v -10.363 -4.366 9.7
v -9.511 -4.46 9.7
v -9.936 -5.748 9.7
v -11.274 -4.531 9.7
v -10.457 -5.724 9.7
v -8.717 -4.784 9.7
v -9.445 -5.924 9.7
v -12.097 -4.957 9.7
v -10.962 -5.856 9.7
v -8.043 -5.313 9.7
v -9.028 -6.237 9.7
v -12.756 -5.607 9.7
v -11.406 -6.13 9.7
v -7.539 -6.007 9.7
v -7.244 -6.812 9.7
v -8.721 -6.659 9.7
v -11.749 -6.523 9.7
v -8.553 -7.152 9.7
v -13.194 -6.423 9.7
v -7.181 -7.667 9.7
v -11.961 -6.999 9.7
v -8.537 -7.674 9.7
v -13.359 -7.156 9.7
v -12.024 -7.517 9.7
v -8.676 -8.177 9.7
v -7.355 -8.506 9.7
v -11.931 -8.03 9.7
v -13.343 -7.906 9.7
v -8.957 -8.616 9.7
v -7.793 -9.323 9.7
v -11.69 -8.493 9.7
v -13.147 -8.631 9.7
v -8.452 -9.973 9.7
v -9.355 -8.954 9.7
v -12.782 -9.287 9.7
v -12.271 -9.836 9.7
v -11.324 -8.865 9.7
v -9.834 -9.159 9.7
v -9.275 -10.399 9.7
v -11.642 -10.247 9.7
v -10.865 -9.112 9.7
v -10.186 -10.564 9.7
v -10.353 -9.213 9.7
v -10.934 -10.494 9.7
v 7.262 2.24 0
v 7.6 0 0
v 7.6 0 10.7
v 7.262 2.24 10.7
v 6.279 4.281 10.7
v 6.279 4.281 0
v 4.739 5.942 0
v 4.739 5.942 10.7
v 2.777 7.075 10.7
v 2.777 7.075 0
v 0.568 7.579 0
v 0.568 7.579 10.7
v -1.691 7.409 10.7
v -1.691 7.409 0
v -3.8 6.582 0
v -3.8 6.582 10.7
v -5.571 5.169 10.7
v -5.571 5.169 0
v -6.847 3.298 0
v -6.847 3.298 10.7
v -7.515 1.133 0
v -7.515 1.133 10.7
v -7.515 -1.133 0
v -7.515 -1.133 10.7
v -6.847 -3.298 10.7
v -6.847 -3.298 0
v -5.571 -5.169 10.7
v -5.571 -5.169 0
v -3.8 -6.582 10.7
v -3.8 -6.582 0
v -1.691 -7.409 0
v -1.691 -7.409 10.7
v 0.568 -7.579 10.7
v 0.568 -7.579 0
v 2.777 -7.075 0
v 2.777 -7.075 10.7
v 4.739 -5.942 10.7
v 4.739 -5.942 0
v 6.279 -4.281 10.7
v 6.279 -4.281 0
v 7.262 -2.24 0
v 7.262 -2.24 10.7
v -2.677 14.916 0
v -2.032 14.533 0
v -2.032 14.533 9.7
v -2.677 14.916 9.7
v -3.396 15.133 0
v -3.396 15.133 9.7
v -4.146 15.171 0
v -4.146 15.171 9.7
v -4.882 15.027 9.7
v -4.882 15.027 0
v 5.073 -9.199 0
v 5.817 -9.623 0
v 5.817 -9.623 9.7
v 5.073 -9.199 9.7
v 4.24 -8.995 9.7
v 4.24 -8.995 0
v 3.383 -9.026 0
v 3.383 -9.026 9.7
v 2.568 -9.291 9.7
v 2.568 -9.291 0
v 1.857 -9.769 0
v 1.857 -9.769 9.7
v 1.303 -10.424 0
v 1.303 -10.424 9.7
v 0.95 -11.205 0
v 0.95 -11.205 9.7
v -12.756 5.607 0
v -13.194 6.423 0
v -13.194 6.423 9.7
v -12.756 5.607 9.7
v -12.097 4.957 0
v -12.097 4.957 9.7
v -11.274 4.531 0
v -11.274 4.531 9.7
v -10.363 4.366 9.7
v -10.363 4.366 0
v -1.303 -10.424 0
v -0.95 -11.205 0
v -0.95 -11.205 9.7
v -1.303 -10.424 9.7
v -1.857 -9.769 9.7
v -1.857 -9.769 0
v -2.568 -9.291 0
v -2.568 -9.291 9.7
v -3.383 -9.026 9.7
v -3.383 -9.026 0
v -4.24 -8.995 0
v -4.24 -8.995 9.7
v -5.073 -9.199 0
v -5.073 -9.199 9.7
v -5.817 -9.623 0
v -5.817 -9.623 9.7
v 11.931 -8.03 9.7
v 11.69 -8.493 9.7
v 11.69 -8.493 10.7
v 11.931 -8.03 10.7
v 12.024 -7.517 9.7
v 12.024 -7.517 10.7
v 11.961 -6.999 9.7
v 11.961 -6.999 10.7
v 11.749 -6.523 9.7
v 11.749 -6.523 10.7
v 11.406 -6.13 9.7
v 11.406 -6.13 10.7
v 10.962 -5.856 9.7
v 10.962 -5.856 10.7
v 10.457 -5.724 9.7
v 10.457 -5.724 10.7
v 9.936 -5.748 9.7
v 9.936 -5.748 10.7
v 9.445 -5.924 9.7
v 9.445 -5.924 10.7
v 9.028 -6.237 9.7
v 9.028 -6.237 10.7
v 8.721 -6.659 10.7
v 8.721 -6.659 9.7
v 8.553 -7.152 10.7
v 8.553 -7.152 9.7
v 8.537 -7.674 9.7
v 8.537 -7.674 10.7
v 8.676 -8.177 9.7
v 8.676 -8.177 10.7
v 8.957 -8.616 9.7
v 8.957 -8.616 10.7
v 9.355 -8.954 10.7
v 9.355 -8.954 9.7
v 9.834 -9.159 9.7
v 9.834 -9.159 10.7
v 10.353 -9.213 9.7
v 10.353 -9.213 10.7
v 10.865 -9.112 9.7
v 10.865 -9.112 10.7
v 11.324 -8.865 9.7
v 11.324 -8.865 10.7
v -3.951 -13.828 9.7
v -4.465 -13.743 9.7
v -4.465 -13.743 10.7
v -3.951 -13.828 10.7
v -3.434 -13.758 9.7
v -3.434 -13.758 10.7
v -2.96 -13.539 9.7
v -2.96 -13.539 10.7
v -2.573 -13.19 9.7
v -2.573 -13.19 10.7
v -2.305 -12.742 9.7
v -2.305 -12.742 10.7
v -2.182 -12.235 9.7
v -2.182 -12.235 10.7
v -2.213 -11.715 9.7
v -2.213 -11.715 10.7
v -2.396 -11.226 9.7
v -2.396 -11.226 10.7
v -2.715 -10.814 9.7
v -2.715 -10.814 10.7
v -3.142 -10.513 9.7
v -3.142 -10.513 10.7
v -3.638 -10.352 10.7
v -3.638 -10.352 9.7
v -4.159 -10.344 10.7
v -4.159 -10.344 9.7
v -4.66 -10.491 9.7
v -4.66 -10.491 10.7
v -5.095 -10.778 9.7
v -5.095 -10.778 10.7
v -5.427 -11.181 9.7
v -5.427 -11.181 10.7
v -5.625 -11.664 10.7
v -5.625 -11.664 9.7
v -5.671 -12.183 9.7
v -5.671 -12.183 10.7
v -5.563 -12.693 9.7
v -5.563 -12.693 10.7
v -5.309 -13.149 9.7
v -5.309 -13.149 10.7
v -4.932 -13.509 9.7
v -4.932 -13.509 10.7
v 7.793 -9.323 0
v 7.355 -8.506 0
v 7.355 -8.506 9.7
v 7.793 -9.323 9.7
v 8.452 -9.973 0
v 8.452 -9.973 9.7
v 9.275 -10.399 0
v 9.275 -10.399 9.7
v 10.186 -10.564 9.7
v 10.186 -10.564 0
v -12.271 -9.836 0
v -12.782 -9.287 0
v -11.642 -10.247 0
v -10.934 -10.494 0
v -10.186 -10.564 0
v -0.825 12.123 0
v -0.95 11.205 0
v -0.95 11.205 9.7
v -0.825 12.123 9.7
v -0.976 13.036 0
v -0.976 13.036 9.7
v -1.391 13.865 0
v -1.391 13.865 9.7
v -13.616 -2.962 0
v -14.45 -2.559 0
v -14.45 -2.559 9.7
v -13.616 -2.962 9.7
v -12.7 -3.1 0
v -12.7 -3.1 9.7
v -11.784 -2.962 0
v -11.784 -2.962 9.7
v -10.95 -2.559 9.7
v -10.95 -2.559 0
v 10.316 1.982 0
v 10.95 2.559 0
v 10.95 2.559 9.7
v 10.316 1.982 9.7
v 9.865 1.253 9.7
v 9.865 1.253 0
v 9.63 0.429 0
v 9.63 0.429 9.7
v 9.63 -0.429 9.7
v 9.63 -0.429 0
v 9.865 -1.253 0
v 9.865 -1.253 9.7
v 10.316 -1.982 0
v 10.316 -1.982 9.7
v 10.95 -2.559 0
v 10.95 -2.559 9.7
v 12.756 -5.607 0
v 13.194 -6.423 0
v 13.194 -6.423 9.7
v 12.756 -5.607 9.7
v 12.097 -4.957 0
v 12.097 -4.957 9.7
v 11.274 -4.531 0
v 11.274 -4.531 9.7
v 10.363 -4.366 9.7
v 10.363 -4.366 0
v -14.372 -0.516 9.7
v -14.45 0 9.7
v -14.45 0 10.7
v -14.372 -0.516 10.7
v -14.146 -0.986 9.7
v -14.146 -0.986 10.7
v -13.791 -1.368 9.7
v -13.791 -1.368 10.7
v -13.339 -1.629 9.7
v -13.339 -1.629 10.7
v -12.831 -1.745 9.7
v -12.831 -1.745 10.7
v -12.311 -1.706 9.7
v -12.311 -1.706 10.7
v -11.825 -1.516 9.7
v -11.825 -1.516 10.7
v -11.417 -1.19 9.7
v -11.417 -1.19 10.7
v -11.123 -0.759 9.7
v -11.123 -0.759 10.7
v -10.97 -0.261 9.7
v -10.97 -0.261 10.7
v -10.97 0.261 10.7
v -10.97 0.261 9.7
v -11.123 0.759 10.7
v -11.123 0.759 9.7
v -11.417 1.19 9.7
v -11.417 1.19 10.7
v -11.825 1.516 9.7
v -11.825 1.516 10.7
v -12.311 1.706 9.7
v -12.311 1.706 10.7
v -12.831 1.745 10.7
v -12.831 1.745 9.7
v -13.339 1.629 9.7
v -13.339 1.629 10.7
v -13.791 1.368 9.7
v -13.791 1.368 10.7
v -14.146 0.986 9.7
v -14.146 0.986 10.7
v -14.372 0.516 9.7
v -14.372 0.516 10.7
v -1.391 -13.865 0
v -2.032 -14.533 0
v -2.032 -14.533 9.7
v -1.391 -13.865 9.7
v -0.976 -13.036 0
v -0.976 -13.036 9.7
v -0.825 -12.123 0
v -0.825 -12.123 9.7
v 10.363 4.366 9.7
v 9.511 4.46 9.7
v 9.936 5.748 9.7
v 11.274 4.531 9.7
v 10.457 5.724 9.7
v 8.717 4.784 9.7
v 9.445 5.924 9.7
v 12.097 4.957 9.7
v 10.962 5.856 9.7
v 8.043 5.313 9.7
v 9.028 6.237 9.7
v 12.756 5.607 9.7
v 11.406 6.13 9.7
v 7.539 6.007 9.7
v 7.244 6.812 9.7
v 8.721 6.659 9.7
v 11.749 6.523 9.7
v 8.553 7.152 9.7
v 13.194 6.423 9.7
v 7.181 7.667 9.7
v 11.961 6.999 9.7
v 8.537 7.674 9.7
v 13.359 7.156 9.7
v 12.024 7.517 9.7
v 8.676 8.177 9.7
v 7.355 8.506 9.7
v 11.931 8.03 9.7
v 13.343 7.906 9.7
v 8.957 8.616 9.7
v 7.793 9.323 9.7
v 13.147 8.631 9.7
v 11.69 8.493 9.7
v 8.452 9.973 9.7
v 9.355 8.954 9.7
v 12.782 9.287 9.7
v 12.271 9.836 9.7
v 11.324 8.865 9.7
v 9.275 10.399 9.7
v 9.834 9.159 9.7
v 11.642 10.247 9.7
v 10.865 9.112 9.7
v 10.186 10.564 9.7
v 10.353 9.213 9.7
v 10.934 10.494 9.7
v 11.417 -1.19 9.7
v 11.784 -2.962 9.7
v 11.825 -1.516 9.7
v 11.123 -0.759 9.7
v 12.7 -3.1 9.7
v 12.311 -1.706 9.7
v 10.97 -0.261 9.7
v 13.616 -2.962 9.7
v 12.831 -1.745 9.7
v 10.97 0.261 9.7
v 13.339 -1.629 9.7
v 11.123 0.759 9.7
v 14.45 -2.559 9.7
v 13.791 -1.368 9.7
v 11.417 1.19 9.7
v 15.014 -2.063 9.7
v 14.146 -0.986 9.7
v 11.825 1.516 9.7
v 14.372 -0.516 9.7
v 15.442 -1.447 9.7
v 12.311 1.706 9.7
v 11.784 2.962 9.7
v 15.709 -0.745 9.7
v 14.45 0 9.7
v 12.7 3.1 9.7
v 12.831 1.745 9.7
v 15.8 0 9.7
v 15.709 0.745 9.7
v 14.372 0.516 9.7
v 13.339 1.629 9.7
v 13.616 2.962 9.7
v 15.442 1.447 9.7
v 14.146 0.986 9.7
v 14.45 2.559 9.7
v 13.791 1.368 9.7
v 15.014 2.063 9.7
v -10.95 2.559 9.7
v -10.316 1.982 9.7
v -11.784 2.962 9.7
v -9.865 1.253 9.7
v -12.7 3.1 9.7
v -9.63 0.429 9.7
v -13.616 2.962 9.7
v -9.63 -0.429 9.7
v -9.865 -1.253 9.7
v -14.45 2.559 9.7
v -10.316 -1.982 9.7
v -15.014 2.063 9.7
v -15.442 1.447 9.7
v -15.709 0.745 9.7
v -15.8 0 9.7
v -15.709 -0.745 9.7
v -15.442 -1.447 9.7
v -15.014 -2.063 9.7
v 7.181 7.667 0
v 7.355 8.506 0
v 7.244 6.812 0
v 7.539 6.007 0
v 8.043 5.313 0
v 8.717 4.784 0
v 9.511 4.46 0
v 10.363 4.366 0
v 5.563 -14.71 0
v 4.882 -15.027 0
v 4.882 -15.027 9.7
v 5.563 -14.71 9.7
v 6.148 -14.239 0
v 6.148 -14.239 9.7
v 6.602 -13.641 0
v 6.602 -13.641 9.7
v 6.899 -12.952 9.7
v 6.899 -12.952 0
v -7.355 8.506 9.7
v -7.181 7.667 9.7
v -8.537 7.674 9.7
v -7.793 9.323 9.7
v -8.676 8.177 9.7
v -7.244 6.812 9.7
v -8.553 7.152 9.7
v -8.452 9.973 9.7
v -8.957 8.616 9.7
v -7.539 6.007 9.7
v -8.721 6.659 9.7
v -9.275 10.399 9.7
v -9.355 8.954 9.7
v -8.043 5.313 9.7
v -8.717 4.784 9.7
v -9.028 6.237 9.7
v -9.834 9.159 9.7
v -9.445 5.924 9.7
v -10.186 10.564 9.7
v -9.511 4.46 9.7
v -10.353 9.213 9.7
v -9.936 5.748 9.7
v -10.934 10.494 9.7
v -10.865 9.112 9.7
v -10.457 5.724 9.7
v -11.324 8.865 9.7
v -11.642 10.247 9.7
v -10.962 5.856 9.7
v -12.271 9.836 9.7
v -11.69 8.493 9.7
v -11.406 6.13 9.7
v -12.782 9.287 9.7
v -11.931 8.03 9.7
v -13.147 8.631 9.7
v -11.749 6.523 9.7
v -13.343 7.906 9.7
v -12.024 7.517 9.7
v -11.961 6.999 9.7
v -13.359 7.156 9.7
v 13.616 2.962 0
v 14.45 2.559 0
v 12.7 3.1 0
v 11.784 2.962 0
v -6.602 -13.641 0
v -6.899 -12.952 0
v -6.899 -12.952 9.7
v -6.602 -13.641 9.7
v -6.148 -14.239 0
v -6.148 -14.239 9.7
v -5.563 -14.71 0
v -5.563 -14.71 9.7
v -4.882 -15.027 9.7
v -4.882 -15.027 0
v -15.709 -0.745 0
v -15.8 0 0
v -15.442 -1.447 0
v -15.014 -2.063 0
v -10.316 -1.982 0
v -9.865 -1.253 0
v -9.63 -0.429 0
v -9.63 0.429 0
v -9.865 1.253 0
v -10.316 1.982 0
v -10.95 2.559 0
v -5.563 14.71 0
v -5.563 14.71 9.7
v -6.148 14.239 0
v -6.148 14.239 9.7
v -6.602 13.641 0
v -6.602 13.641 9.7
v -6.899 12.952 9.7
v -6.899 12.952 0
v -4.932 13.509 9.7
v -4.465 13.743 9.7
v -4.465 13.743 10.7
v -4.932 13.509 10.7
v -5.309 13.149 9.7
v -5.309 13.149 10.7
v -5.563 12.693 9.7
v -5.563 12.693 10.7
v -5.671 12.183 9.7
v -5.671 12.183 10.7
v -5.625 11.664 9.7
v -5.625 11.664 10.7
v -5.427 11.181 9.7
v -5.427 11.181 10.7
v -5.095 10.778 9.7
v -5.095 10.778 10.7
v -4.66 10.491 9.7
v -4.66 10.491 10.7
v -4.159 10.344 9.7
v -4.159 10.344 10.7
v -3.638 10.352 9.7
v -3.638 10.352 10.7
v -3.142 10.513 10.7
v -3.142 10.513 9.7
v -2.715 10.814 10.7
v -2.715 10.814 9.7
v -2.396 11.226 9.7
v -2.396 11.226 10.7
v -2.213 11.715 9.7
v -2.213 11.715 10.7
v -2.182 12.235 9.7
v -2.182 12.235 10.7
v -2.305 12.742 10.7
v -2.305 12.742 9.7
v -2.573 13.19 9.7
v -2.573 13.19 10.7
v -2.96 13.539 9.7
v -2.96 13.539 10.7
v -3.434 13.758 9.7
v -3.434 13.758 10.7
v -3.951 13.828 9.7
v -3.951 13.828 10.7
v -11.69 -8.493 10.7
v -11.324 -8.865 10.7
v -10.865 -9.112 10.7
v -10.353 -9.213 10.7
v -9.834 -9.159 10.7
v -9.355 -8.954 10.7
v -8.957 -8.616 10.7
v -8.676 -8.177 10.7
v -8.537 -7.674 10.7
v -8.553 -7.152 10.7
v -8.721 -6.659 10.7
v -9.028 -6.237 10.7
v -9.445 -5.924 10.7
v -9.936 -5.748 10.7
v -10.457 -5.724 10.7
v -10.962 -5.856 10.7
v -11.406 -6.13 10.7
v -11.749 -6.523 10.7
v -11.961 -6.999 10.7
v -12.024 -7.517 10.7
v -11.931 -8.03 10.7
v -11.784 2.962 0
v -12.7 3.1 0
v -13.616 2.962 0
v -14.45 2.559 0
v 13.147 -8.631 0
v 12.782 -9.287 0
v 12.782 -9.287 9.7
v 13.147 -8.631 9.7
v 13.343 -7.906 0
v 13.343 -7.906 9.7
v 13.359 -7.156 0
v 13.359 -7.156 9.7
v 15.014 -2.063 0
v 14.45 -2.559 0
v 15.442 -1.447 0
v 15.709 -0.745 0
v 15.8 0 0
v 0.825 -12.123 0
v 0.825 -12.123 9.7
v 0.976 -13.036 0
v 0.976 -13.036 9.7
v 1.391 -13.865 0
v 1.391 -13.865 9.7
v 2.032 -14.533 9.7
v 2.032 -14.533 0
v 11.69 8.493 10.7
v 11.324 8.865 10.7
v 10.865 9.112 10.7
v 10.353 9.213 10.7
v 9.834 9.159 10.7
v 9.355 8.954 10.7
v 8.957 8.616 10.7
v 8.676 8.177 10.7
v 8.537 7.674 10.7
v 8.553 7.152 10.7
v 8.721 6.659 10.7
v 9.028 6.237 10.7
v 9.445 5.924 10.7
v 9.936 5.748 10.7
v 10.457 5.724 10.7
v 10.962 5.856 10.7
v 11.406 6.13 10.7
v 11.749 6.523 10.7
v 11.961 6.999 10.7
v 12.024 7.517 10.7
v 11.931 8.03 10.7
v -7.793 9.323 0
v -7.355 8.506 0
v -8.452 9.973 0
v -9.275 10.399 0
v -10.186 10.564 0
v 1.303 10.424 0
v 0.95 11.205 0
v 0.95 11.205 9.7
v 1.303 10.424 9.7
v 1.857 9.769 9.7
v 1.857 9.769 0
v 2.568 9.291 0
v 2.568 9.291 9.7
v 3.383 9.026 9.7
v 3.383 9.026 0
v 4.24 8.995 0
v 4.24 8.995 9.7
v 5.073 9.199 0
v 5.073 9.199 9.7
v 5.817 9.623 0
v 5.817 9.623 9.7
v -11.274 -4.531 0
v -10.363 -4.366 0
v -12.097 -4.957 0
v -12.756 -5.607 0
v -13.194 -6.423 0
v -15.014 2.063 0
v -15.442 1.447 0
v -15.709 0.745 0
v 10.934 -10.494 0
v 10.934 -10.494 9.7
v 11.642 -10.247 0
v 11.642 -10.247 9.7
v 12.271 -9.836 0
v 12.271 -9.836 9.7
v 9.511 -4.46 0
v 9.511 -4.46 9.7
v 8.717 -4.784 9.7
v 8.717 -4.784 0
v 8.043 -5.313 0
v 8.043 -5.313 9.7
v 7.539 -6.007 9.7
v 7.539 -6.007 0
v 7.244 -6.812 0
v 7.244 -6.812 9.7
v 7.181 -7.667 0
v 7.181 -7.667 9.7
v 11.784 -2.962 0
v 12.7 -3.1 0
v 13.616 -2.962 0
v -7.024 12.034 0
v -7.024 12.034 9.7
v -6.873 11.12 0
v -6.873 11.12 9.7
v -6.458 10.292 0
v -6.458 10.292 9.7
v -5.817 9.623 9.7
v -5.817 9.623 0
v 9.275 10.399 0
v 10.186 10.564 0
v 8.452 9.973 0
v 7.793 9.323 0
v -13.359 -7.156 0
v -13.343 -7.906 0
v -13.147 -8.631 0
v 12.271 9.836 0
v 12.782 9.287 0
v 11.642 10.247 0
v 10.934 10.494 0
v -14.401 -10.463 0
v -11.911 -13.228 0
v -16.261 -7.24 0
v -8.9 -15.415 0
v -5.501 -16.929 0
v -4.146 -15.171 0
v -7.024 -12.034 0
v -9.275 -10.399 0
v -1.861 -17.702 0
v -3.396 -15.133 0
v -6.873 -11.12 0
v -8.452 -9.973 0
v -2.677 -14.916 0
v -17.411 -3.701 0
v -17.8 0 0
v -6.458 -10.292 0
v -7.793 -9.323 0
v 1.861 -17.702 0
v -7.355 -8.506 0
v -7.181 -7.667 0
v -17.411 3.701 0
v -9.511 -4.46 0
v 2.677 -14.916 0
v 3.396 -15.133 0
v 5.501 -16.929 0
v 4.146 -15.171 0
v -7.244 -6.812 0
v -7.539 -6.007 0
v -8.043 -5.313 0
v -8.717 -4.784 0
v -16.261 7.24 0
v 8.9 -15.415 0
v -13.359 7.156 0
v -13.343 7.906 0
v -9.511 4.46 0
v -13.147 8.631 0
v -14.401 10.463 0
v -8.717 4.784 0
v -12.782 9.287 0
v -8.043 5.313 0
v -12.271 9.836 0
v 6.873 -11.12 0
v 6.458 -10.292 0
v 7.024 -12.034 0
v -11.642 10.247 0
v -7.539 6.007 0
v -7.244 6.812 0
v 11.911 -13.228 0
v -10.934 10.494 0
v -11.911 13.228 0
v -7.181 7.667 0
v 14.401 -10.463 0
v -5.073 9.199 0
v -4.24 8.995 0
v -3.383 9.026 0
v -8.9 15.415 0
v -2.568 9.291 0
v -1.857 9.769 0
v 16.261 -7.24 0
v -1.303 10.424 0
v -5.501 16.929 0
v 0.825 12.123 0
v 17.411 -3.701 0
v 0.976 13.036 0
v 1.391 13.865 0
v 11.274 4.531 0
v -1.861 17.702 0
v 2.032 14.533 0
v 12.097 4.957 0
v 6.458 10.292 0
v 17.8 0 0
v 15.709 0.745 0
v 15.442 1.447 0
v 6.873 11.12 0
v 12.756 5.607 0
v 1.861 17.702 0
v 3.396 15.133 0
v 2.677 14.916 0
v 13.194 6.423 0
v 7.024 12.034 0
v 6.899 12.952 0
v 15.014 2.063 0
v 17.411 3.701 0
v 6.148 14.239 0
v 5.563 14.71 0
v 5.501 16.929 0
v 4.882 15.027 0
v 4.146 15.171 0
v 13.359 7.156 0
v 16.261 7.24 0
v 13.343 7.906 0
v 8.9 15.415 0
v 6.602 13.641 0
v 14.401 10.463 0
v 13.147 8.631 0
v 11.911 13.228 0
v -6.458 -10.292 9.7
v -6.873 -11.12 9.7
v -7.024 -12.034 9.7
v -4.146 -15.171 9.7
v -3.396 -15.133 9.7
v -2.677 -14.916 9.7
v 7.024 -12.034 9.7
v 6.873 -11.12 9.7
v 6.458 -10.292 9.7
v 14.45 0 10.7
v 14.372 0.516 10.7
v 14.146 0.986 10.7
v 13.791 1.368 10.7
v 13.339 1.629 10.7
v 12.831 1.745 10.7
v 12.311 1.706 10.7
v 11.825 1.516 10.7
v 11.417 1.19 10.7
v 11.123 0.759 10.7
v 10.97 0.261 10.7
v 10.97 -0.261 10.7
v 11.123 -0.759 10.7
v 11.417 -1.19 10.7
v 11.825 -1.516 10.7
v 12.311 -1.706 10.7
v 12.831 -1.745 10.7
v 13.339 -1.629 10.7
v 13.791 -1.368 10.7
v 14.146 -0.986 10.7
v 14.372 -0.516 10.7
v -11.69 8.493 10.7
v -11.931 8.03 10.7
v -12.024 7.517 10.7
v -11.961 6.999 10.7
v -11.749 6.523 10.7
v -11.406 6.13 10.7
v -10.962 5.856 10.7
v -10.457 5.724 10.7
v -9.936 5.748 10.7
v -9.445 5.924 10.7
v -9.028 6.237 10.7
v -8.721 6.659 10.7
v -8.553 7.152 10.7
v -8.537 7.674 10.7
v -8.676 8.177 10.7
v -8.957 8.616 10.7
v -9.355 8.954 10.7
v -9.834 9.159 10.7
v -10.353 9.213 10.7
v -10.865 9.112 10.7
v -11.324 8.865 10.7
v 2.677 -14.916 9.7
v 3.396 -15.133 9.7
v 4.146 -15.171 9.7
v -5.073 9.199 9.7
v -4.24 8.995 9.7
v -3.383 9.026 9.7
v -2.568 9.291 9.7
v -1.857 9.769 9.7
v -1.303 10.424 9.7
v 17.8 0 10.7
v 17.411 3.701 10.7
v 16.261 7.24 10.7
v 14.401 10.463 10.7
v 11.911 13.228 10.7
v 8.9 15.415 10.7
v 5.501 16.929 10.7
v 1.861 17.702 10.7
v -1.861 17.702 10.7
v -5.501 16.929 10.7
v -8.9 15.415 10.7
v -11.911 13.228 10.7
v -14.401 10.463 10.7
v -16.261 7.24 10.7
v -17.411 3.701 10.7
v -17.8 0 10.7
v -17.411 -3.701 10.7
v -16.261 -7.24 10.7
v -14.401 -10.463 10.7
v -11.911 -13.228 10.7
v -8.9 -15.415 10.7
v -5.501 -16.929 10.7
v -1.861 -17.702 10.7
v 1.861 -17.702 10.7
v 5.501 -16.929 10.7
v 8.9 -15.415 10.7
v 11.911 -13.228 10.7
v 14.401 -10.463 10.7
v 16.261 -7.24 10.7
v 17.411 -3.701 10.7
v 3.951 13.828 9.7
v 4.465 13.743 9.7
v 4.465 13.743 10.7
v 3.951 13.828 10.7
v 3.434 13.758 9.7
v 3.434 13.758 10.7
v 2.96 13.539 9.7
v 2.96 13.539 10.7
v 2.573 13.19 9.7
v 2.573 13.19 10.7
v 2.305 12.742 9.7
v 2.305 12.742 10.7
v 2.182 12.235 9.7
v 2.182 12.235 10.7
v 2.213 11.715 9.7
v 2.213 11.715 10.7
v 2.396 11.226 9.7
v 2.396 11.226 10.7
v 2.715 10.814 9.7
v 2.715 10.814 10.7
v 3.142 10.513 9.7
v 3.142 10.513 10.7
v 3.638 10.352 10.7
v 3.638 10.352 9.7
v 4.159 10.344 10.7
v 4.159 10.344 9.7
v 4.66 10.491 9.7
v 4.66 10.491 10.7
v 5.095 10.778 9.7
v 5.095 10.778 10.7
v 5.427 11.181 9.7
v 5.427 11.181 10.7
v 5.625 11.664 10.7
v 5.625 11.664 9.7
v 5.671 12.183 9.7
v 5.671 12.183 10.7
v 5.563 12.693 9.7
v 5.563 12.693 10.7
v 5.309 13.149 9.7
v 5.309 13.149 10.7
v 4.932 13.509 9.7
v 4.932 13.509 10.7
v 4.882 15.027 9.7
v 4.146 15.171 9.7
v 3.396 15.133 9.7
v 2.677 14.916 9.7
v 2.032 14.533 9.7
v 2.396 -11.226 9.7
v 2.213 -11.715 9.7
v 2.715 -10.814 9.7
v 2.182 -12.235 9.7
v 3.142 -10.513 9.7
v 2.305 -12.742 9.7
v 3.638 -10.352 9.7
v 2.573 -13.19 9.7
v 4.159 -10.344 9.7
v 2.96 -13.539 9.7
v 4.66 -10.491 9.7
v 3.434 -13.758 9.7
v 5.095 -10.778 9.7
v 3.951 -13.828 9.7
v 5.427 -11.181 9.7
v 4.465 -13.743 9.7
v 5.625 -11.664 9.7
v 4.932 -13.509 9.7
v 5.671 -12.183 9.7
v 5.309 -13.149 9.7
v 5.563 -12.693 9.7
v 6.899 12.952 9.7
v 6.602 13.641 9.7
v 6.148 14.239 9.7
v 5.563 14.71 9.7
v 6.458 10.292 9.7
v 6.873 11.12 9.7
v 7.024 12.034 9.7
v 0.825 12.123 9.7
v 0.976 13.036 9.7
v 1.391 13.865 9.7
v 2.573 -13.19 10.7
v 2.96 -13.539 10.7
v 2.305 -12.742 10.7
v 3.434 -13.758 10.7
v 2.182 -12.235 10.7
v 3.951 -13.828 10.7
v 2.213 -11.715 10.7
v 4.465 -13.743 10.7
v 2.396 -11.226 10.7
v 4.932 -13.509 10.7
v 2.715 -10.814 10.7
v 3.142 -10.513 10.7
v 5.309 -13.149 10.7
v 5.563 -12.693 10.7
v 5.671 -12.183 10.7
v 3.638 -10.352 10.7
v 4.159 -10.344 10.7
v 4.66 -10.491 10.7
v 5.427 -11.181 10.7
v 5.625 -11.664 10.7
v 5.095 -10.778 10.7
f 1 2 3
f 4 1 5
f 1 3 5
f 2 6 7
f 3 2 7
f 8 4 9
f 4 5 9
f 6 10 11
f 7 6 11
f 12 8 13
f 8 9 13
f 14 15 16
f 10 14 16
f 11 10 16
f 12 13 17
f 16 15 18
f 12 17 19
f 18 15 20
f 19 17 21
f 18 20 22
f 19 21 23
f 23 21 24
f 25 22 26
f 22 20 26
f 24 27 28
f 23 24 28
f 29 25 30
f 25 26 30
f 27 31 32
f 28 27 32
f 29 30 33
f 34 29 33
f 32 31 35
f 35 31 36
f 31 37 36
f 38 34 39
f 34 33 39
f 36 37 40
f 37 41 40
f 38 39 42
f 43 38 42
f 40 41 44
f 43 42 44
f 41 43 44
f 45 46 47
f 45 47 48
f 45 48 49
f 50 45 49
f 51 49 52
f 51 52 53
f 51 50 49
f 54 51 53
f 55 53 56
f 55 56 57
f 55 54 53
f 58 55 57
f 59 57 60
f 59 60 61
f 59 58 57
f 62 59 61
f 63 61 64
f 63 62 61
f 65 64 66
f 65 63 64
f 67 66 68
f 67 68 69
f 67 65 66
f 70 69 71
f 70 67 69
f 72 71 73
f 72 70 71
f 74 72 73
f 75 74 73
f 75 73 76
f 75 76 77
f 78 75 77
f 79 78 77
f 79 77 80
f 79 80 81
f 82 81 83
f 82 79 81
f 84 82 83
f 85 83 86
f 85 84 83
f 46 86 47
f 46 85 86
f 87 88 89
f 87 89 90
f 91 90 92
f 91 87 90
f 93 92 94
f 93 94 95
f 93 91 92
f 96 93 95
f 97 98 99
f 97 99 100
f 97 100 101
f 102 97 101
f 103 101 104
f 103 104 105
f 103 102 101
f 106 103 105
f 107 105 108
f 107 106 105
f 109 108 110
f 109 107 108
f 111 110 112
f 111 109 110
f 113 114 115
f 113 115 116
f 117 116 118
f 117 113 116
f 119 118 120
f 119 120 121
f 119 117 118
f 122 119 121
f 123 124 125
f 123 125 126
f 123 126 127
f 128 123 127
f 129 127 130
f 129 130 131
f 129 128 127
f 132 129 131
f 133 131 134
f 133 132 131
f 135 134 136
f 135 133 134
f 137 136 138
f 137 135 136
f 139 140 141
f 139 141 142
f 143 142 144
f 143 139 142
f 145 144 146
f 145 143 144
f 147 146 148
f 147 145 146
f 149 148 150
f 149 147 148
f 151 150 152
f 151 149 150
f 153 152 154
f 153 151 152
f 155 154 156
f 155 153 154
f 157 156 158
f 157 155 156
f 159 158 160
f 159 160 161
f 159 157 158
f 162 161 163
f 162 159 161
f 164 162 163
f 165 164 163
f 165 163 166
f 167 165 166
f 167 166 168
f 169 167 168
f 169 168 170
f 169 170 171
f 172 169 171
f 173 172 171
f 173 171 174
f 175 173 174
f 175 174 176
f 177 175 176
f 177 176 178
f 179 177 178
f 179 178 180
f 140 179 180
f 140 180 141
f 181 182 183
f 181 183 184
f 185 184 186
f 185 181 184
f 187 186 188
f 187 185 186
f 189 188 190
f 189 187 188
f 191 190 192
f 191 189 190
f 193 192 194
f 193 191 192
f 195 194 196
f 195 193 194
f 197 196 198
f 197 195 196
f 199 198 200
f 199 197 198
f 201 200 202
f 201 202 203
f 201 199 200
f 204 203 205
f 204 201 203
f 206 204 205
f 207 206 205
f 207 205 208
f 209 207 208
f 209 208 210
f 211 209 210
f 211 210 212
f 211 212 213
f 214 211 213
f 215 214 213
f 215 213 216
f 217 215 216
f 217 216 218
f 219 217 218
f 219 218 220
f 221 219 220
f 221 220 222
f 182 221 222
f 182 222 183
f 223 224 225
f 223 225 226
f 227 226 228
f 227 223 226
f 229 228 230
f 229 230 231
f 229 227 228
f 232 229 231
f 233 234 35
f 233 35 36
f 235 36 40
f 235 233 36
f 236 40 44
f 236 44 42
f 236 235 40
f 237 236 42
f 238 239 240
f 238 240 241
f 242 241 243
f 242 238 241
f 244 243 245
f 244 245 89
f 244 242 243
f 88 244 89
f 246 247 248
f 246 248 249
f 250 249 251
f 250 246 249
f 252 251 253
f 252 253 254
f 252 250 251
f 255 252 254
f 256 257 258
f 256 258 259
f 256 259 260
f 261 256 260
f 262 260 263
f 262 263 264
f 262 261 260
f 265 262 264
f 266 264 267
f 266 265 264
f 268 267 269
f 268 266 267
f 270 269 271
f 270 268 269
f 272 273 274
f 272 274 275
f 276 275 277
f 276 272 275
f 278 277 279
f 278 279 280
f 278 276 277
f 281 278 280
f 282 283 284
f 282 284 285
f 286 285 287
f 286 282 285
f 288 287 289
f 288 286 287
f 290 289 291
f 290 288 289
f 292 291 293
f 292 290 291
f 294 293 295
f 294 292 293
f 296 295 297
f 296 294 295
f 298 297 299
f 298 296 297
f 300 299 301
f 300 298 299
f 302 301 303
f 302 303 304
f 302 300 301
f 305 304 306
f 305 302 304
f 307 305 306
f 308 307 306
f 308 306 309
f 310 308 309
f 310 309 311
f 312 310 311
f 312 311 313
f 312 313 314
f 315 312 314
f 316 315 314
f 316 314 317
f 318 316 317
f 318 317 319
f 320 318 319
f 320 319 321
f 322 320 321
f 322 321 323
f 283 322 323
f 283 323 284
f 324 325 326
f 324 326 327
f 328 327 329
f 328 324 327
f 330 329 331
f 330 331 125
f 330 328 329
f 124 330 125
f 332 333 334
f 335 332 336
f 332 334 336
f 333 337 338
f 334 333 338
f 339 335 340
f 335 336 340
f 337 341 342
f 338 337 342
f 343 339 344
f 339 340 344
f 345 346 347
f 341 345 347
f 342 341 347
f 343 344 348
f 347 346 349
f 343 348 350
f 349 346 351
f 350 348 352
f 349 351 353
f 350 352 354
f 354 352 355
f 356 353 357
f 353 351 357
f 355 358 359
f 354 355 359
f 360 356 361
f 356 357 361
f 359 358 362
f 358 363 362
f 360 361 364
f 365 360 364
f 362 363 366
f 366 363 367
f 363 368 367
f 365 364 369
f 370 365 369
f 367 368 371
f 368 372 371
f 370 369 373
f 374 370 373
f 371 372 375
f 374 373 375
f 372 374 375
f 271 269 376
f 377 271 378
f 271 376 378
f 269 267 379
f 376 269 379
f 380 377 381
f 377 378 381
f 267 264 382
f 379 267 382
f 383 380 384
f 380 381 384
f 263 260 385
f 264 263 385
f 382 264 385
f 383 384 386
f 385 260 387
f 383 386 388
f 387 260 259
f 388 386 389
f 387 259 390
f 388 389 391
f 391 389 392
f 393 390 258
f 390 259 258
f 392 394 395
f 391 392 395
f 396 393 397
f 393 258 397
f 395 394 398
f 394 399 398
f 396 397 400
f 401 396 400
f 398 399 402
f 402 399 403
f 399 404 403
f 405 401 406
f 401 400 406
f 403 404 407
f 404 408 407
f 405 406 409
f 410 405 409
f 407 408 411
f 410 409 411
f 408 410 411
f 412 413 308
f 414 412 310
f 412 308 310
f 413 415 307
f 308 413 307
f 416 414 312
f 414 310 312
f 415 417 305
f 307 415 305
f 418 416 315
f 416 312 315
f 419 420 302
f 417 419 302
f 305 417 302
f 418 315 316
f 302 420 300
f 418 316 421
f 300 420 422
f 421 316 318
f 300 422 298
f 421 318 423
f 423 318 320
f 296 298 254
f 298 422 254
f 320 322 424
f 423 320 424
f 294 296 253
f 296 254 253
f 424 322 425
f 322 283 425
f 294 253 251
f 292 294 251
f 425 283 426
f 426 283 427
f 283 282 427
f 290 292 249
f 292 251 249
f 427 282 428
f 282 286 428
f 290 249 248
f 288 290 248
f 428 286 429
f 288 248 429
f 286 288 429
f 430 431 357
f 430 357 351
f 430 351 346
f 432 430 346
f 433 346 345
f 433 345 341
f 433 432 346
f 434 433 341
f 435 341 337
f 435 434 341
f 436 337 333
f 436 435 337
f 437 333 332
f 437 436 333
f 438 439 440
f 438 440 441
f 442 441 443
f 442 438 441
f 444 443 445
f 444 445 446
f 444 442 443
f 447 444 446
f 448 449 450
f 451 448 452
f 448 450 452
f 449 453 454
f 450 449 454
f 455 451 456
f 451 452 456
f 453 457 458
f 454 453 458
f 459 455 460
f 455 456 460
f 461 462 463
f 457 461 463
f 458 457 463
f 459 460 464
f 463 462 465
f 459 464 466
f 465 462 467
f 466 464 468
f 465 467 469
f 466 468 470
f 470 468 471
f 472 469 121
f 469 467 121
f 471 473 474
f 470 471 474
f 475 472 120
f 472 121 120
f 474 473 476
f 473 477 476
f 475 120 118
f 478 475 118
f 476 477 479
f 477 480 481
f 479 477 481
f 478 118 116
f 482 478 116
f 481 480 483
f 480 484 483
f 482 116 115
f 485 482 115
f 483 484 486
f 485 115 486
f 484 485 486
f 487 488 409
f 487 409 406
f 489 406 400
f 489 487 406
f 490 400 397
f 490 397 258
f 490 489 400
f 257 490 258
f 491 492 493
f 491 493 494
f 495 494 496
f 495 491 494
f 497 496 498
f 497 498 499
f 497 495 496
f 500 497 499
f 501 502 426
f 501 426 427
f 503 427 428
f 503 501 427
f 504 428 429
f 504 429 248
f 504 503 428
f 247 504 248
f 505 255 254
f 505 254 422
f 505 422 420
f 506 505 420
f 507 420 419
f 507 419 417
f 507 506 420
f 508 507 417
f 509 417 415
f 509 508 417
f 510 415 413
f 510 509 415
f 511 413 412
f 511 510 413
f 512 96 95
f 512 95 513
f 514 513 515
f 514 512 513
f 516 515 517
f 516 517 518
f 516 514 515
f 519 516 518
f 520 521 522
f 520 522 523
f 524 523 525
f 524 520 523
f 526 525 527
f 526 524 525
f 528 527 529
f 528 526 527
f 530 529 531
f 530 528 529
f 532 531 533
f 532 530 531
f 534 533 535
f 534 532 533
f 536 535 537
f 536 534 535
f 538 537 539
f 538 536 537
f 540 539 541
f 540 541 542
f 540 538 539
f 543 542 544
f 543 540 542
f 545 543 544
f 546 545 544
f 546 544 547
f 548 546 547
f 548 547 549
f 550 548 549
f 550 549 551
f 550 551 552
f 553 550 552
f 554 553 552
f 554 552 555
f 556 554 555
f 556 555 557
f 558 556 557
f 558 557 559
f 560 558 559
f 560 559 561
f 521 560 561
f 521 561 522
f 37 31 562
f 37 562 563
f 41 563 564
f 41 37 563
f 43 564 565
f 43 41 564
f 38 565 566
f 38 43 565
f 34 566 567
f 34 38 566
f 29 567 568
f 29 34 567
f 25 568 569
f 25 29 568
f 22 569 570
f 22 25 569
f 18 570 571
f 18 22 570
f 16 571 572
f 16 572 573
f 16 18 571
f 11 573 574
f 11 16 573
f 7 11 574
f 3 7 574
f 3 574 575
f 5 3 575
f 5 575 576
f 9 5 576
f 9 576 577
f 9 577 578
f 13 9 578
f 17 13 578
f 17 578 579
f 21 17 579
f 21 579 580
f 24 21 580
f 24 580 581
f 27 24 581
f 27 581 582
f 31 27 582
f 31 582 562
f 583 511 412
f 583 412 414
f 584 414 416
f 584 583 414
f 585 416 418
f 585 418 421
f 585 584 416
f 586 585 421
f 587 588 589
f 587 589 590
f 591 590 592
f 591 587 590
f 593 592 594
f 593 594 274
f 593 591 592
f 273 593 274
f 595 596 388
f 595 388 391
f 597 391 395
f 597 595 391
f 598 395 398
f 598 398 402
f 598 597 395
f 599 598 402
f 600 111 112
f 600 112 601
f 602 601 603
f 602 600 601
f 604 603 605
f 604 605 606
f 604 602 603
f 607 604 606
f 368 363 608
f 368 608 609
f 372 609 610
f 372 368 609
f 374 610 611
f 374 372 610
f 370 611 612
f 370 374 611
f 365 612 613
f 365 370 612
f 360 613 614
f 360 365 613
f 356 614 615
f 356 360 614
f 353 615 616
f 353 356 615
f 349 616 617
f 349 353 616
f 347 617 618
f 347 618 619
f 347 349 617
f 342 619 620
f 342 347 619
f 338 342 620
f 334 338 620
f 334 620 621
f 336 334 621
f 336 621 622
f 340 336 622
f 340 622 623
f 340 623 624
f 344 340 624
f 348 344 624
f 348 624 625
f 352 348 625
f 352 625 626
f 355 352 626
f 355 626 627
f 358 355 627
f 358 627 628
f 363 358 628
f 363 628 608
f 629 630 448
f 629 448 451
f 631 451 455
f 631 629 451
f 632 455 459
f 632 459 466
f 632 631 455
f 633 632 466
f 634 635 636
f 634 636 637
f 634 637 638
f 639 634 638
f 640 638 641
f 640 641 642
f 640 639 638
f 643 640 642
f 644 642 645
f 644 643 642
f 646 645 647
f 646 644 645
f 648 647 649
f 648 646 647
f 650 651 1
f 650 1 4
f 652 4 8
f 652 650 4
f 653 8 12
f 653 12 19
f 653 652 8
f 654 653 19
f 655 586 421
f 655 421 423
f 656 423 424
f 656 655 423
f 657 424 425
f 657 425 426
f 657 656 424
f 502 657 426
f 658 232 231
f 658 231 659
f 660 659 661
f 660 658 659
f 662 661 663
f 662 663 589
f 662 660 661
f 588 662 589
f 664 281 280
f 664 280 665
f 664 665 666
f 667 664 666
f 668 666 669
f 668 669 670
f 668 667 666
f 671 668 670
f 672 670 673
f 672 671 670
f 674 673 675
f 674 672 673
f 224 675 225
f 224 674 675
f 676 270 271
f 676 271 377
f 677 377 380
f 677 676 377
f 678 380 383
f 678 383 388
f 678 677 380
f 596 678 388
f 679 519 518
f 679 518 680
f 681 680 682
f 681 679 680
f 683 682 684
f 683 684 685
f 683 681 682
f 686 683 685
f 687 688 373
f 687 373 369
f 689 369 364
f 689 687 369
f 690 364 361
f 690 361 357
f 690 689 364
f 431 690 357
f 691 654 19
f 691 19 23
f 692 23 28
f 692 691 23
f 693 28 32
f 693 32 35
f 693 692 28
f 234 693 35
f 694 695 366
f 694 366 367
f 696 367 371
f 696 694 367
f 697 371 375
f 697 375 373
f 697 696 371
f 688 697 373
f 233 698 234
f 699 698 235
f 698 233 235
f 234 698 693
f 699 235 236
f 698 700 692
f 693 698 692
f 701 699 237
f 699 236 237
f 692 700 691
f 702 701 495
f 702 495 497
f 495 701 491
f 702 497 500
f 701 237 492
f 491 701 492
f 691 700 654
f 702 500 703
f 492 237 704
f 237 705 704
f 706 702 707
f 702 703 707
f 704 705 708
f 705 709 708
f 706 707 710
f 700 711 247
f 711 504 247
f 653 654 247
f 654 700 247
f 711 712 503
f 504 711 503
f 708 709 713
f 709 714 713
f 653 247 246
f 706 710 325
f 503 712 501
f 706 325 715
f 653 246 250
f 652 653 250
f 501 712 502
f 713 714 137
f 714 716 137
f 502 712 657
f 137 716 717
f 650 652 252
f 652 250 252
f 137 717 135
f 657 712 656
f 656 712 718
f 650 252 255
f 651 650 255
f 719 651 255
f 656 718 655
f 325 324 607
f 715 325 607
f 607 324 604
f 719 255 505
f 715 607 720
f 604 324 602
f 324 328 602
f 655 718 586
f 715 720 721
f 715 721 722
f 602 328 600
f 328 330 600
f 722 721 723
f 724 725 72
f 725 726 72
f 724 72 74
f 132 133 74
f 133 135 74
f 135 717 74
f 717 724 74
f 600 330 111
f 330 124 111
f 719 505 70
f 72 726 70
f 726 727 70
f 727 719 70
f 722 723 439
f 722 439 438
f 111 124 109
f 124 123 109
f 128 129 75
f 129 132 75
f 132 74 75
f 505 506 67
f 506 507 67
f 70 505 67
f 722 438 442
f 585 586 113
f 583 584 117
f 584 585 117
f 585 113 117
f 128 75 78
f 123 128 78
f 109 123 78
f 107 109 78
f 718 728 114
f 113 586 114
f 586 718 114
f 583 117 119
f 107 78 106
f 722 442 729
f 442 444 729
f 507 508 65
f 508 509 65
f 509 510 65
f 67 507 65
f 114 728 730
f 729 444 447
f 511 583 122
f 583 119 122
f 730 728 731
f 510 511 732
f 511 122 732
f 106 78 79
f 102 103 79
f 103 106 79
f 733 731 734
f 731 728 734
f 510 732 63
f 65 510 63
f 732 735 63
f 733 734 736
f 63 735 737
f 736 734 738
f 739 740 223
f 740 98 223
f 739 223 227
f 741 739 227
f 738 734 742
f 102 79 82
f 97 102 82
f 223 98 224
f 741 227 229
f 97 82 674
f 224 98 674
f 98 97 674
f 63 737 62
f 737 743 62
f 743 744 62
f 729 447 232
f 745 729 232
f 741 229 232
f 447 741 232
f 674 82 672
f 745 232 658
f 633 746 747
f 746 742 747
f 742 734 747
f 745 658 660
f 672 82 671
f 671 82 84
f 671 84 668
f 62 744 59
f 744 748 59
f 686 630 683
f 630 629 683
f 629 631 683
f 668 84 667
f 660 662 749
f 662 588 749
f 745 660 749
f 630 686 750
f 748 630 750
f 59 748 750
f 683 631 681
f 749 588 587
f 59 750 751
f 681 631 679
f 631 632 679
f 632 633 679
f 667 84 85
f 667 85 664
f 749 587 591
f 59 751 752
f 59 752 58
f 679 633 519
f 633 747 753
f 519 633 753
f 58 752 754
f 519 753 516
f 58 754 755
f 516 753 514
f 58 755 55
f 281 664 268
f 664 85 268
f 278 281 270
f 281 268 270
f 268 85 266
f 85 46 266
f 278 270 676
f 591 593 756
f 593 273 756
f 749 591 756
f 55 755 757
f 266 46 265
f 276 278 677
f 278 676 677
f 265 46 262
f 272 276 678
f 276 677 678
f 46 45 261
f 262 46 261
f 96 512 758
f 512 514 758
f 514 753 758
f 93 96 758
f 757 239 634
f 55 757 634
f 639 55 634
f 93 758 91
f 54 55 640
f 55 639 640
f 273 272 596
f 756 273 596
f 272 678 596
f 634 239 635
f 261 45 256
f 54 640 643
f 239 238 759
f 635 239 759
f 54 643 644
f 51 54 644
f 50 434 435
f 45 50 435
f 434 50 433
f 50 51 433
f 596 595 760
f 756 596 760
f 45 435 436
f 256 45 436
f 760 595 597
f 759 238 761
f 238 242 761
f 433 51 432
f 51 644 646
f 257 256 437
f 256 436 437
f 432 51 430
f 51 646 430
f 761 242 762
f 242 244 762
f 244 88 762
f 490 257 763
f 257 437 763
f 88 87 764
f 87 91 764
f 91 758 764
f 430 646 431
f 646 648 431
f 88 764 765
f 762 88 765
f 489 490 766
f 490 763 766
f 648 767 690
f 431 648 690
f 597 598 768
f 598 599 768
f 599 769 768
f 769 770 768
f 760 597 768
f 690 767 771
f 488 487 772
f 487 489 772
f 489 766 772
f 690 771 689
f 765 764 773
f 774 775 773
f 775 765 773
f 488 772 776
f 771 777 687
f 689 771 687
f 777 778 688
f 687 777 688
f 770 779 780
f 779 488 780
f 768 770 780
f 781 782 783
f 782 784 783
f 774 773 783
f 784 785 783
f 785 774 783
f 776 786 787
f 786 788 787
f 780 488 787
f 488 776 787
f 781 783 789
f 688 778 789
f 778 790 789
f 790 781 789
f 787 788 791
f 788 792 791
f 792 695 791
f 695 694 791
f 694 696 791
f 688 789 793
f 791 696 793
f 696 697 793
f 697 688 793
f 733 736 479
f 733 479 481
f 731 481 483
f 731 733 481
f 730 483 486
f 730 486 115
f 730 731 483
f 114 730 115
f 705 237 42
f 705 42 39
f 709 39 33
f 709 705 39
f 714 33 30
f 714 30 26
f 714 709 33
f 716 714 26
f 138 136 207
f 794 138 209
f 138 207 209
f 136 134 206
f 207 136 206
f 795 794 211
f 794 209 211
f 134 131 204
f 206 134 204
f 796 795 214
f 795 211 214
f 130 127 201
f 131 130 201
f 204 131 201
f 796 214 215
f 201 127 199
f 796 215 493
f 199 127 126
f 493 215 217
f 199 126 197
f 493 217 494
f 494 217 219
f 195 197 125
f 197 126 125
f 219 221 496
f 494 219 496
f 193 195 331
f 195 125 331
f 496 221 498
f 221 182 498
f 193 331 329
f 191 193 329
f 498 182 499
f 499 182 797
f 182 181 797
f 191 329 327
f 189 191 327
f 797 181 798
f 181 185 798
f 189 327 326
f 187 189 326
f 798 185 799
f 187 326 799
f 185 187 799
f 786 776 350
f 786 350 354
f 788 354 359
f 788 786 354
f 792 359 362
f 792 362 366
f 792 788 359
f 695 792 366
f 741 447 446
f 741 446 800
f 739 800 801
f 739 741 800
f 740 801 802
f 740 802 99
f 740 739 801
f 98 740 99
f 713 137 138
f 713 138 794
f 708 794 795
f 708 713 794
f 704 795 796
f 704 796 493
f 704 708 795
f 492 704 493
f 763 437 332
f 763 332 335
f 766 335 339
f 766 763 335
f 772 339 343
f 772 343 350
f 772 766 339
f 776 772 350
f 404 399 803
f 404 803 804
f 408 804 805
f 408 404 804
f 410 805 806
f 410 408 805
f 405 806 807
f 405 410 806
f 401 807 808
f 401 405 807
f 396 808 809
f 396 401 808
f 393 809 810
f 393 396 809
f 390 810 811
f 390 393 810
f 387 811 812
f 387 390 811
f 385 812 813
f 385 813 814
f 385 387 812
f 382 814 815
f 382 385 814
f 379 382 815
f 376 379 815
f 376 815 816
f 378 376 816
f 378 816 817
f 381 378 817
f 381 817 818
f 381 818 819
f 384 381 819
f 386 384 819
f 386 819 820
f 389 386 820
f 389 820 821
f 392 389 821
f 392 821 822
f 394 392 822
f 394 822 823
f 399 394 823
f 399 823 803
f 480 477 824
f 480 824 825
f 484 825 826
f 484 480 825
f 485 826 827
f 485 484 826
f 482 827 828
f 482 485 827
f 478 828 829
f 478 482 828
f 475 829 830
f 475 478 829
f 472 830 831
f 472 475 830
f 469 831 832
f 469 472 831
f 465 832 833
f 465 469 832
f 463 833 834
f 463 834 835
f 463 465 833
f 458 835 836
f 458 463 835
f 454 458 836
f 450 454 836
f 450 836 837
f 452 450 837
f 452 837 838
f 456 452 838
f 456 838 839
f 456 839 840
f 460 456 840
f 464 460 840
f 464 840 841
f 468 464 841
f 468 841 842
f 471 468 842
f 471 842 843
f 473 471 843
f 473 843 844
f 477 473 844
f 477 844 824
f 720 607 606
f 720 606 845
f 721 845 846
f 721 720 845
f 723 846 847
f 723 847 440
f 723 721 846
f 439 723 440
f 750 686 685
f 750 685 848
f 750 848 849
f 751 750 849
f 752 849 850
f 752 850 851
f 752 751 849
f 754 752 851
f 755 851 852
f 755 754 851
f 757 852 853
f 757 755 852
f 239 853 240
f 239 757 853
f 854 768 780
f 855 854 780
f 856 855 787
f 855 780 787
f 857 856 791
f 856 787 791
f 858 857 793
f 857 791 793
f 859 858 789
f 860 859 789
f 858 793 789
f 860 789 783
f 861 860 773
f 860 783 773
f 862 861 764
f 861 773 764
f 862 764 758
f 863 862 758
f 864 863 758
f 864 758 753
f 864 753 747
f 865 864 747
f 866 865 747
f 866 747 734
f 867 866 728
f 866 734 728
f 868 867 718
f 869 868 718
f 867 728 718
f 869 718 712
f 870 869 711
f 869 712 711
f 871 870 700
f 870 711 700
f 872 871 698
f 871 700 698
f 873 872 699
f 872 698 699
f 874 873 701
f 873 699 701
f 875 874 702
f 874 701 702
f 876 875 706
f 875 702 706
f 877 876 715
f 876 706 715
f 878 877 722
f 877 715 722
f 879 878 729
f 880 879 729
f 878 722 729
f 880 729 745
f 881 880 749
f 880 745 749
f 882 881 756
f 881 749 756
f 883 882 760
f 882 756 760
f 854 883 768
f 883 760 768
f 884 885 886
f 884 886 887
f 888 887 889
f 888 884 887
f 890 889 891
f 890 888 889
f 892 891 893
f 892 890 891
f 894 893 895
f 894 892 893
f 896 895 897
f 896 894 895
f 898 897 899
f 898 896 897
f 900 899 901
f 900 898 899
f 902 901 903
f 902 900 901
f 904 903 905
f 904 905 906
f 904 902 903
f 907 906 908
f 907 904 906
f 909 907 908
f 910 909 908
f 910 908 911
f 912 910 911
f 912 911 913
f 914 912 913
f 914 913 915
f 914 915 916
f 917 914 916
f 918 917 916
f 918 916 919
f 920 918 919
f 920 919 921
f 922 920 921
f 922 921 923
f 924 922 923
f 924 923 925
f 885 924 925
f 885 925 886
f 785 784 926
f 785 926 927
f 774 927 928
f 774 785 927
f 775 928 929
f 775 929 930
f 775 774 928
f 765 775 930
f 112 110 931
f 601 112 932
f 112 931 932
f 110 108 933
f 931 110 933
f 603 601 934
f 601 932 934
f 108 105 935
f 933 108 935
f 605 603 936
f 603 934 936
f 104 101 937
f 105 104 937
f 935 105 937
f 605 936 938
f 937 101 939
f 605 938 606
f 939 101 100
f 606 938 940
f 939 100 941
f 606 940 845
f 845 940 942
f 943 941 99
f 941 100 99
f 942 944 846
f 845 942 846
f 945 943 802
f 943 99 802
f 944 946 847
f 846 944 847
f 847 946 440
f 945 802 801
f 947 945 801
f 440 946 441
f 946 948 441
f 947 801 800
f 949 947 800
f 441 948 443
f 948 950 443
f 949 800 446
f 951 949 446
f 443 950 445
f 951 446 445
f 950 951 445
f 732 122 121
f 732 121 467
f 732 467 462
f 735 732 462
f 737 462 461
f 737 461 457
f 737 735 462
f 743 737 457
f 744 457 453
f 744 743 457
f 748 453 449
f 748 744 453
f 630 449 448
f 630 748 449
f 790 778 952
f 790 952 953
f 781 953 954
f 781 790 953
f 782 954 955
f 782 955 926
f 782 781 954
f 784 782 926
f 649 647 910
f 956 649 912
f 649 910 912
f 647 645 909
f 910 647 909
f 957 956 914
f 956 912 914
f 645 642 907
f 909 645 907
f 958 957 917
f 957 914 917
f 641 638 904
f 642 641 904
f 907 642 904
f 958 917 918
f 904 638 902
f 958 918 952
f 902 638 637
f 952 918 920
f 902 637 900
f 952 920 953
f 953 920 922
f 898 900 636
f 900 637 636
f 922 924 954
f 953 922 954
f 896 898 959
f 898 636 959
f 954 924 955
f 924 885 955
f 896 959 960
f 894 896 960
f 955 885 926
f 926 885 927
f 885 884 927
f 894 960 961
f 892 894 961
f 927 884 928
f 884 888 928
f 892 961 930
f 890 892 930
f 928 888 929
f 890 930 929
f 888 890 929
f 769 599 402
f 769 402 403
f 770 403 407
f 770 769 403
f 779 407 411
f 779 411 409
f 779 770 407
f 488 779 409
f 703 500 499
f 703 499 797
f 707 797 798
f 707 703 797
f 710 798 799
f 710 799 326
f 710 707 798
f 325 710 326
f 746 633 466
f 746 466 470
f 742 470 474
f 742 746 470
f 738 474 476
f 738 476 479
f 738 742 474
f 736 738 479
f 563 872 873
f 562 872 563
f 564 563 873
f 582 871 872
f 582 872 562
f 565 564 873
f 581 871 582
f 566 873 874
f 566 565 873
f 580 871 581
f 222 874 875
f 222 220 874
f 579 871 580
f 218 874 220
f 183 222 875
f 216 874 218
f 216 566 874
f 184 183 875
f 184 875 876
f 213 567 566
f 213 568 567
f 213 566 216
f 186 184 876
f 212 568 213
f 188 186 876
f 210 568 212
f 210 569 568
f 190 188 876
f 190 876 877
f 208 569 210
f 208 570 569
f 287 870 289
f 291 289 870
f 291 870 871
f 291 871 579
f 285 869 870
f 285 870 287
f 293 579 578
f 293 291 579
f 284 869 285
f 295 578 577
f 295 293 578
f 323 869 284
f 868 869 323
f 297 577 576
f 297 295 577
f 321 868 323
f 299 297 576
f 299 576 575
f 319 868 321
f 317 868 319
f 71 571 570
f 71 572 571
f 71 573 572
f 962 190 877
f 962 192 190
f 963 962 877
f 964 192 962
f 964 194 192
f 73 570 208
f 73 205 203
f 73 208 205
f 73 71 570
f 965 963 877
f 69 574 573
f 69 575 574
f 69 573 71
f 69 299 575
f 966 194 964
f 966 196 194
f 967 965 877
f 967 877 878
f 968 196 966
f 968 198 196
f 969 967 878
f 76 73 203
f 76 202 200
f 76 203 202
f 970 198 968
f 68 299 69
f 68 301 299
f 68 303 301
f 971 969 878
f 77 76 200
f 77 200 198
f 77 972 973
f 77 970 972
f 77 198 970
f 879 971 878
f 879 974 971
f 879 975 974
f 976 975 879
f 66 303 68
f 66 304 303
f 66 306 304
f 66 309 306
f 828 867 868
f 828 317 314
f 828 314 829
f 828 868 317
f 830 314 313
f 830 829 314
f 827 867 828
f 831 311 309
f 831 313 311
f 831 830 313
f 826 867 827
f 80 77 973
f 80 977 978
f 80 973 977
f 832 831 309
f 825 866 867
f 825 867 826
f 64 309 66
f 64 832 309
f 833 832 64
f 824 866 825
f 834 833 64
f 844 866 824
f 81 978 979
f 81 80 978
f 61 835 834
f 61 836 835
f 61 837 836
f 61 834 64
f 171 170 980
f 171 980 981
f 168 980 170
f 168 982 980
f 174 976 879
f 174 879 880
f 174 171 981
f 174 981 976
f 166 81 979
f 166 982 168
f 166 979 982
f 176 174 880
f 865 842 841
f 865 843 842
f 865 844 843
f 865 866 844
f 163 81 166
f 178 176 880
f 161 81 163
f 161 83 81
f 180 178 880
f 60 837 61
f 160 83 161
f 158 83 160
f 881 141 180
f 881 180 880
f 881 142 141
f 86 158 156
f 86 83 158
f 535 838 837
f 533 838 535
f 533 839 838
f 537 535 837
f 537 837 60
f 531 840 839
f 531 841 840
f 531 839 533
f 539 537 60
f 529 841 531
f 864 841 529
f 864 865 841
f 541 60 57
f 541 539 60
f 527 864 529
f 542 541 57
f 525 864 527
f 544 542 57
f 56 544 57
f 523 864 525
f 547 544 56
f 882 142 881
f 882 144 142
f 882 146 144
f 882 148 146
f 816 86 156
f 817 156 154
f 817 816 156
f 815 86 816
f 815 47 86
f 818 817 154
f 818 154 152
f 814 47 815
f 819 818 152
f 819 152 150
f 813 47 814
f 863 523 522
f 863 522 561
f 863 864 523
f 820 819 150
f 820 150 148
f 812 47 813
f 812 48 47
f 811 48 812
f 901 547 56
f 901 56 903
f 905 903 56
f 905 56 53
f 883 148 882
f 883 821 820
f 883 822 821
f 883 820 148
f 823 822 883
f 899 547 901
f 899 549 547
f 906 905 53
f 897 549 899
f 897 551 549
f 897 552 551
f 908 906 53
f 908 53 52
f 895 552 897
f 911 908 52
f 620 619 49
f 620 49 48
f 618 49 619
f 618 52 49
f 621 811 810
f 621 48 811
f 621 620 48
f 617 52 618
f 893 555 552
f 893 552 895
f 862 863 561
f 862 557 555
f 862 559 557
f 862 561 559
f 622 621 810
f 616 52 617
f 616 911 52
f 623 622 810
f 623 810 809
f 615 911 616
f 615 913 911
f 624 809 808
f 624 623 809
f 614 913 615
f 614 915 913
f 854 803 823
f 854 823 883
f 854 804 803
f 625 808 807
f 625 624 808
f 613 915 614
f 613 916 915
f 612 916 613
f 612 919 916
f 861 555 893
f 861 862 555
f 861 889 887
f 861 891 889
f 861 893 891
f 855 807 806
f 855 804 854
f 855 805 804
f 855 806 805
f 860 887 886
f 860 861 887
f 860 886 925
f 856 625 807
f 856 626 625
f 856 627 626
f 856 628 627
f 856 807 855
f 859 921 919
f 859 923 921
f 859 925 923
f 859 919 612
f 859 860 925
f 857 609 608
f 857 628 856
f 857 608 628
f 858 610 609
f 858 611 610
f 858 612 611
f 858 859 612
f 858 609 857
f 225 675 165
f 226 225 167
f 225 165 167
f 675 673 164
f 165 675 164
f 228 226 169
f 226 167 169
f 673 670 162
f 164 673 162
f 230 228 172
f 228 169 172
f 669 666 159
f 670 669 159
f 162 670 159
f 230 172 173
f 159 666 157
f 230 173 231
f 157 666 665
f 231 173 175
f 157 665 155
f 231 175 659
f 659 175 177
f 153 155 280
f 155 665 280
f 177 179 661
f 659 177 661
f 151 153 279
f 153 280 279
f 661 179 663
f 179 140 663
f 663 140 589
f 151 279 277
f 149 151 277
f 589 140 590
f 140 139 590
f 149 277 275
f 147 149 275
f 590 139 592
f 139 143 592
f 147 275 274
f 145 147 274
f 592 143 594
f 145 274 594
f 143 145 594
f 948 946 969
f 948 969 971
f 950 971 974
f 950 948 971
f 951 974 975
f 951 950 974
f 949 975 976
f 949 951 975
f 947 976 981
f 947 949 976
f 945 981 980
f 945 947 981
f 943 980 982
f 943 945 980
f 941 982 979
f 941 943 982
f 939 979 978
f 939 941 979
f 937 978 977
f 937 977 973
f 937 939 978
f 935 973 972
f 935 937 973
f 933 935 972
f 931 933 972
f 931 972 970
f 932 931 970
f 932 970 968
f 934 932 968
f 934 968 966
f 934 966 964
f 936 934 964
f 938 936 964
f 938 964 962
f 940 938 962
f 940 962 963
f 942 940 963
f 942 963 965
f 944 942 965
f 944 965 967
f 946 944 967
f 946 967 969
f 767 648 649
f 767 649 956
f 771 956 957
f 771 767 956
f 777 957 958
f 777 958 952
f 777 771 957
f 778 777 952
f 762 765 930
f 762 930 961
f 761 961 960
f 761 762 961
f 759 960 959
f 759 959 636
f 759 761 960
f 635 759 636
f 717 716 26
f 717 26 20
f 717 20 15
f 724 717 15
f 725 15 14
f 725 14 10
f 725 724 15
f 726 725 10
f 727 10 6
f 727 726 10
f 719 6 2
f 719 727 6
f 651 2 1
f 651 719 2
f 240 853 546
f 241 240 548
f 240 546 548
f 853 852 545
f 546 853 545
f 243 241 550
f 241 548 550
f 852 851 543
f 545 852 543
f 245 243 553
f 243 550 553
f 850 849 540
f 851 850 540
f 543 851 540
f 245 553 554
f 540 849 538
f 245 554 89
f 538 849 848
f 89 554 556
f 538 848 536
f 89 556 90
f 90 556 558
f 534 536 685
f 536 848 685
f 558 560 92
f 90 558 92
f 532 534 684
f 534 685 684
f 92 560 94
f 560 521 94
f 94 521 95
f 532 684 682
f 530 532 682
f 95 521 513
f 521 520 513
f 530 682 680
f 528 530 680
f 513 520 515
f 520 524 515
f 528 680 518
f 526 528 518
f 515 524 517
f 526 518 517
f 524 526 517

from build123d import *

# Parameters (mm, degrees)
F0_R            = 17.8
F0_R_2          = 7.6
F0_R_3          = 1.75
F1_DEPTH        = 10.7
F2_DEPTH        = 9.7
F2_COPIES_COUNT = 10
F3_DEPTH        = 10.7
F3_COPIES_COUNT = 10


# Not quite as in the source:
# - a pattern or mirror of a feature is missing from the dataset's text; its kind, count and spacing are read off the source's solid


with BuildPart() as f1:
    # F0 (on Top) → F1 (new body)
    with BuildSketch(Plane.XY):
        Circle(F0_R)
        Circle(F0_R_2, mode=Mode.SUBTRACT)
        with BuildLine():
            ThreePointArc((14.45, 2.5588083164), (15.4418059742, 1.4465476141), (15.8, 0))
            ThreePointArc((15.8, 0), (15.4418059742, -1.4465476141), (14.45, -2.5588083164))
            Line((14.45, -2.5588083164), (14.45, -3.5))
            Line((14.45, -3.5), (10.95, -3.5))
            Line((10.95, -3.5), (10.95, -2.5588083164))
            ThreePointArc((10.95, -2.5588083164), (9.6, 0), (10.95, 2.5588083164))
            Line((10.95, 2.5588083164), (10.95, 3.5))
            Line((10.95, 3.5), (14.45, 3.5))
            Line((14.45, 3.5), (14.45, 2.5588083164))
        make_face(mode=Mode.SUBTRACT)
        with BuildLine():
            ThreePointArc((14.45, -2.5588083164), (15.4418059742, -1.4465476141), (15.8, 0))
            ThreePointArc((15.8, 0), (15.4418059742, 1.4465476141), (14.45, 2.5588083164))
            ThreePointArc((14.45, 2.5588083164), (12.7, 3.1), (10.95, 2.5588083164))
            ThreePointArc((10.95, 2.5588083164), (9.6, 0), (10.95, -2.5588083164))
            ThreePointArc((10.95, -2.5588083164), (12.7, -3.1), (14.45, -2.5588083164))
        make_face()
        with Locations((12.7, 0)):
            Circle(F0_R_3, mode=Mode.SUBTRACT)
        with Locations((12.7, 0)):
            Circle(F0_R_3)
        with BuildLine():
            Line((14.45, -3.5), (14.45, -2.5588083164))
            ThreePointArc((14.45, -2.5588083164), (12.7, -3.1), (10.95, -2.5588083164))
            Line((10.95, -2.5588083164), (10.95, -3.5))
            Line((10.95, -3.5), (14.45, -3.5))
        make_face()
        with BuildLine():
            ThreePointArc((10.95, 2.5588083164), (12.7, 3.1), (14.45, 2.5588083164))
            Line((14.45, 2.5588083164), (14.45, 3.5))
            Line((14.45, 3.5), (10.95, 3.5))
            Line((10.95, 3.5), (10.95, 2.5588083164))
        make_face()
    extrude(amount=F1_DEPTH)

    # F0 (on Top) → F2 (cut)
    with BuildSketch(Plane.XY):
        with BuildLine():
            ThreePointArc((14.45, -2.5588083164), (15.4418059742, -1.4465476141), (15.8, 0))
            ThreePointArc((15.8, 0), (15.4418059742, 1.4465476141), (14.45, 2.5588083164))
            ThreePointArc((14.45, 2.5588083164), (12.7, 3.1), (10.95, 2.5588083164))
            ThreePointArc((10.95, 2.5588083164), (9.6, 0), (10.95, -2.5588083164))
            ThreePointArc((10.95, -2.5588083164), (12.7, -3.1), (14.45, -2.5588083164))
        make_face()
        with Locations((12.7, 0)):
            Circle(F0_R_3, mode=Mode.SUBTRACT)
        with Locations((12.7, 0)):
            Circle(F0_R_3)
    f2 = extrude(amount=F2_DEPTH, mode=Mode.SUBTRACT)

    # F2_copies: F2 ×10 about axis
    f2_copies_axis = Axis((0, 0, 0), (0, 0, 1))
    for i in range(1, F2_COPIES_COUNT):
        add(f2.rotate(f2_copies_axis, i * 360 / F2_COPIES_COUNT), mode=Mode.SUBTRACT)

    # F0 (on Top) → F3 (cut, through all)
    with BuildSketch(Plane.XY):
        with Locations((12.7, 0)):
            Circle(F0_R_3)
    f3 = extrude(amount=F3_DEPTH, mode=Mode.SUBTRACT)

    # F3_copies: F3 ×10 about axis
    f3_copies_axis = Axis((0, 0, 0), (0, 0, 1))
    for i in range(1, F3_COPIES_COUNT):
        add(f3.rotate(f3_copies_axis, i * 360 / F3_COPIES_COUNT), mode=Mode.SUBTRACT)


solid = f1.part
